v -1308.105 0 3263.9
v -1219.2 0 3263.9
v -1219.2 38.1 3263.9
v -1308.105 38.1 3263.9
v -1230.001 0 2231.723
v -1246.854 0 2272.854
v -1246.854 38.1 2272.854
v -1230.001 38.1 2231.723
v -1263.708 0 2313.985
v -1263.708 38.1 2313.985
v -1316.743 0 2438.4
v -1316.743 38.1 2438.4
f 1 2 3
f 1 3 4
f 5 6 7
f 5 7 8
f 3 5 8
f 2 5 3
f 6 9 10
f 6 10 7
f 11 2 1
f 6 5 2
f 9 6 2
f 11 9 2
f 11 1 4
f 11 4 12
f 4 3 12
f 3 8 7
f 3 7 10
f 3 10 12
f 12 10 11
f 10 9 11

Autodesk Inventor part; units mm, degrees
ref_plane "YZ Plane" through (0, 0, 0) normal (1, 0, 0) x (0, 1, 0)
ref_plane "XZ Plane" through (0, 0, 0) normal (0, 1, 0) x (-1, 0, 0)
ref_plane "XY Plane" through (0, 0, 0) normal (0, 0, 1) x (1, 0, 0)
sketch "Sketch1" plane through (0, 0, 0) normal (0, 1, 0) x (-1, 0, 0)
  line L0 (0, 0) -> (0, -1219.2)
  line L1 (0, 0) -> (88.9, 0)
  line L2 (88.9, 0) -> (88.9, -1219.2)
  line L3 (88.9, -1219.2) -> (0, -1219.2)
  line L4 (0, 0) -> (0, 1219.2) construction
  line L5 (0, 1219.2) -> (1219.2, 1219.2) construction
  line L6 (0, 1219.2) -> (0, 3657.6) construction
  line L7 (0, 3657.6) -> (0, 4876.8) construction
  line L8 (0, 4876.8) -> (0, 6096) construction
  line L9 (0, -1219.2) -> (2438.4, -1219.2) construction
  line L10 (0, 6096) -> (2438.4, 6096) construction
  line L11 (2438.4, 6096) -> (2438.4, -1219.2) construction
  line L12 (0, 3657.6) -> (0, 3352.8) construction
  line L13 (0, 3352.8) -> (2438.4, 3352.8) construction
  line L14 (2438.4, 3352.8) -> (1219.2, 3352.8)
  line L15 (1219.2, 3352.8) -> (1219.2, 3263.9)
  line L16 (1219.2, 3263.9) -> (2438.4, 3263.9)
  line L17 (2438.4, 3263.9) -> (2438.4, 3352.8)
  line L18 (0, 6096) -> (862.1046, 6958.1046)
  line L19 (862.1046, 6958.1046) -> (924.9664, 6895.2428)
  line L20 (924.9664, 6895.2428) -> (62.8618, 6033.1382)
  line L21 (62.8618, 6033.1382) -> (0, 6096)
  line L22 (0, 4876.8) -> (1219.2, 4876.8) construction
  line L23 (1219.2, 4876.8) -> (2081.3046, 5738.9046)
  line L24 (1219.2, 1219.2) -> (2081.3046, 357.0954)
  line L25 (2081.3046, 357.0954) -> (2018.4428, 294.2336)
  line L26 (2018.4428, 294.2336) -> (1156.3382, 1156.3382)
  line L27 (1156.3382, 1156.3382) -> (1219.2, 1219.2)
  line L28 (2018.4428, 294.2336) -> (88.9, -1219.2)
  line L29 (2081.3046, 357.0954) -> (2144.1664, 419.9572)
  line L30 (2144.1664, 419.9572) -> (1282.0618, 1282.0618)
  line L31 (1282.0618, 1282.0618) -> (1219.2, 1219.2)
  line L32 (2438.4, 3352.8) -> (2438.4, 3441.7)
  line L33 (2438.4, 3441.7) -> (1219.2, 3441.7)
  line L34 (1219.2, 3441.7) -> (1219.2, 3352.8)
  line L35 (1156.3382, 4939.6618) -> (1282.0618, 4813.9382)
  line L36 (2018.4428, 5801.7664) -> (2144.1664, 5676.0428)
  line L37 (1282.0618, 4813.9382) -> (2144.1664, 5676.0428)
  line L38 (2018.4428, 5801.7664) -> (1156.3382, 4939.6618)
  line L39 (2018.4428, 5801.7664) -> (924.9664, 6895.2428)
  line L40 (62.8618, 6033.1382) -> (1156.3382, 4939.6618)
  line L41 (1233.6206, 4168.8855) -> (1267.6412, 4086.7527)
  line L42 (1263.7078, 2313.9849) -> (1230.0006, 2231.7229)
  arc A0 (862.1046, 6958.1046) -> (0, 6096) centre (431.0523, 6527.0523) ccw
  line L43 (1246.8542, 2272.8539) -> (2375.0183, 1810.583)
  line L44 (2391.8719, 1851.7139) -> (2358.1646, 1769.452)
  line L45 (2391.8719, 1851.7139) -> (1263.7078, 2313.9849)
  line L46 (1230.0006, 2231.7229) -> (2358.1646, 1769.452)
  line L47 (1230.0006, 2231.7229) -> (1219.2, 3263.9)
  line L48 (2144.1664, 419.9572) -> (2391.8719, 1851.7139)
  line L49 (2391.8719, 1851.7139) -> (2438.4, 3263.9)
  line L50 (1219.2, 3441.7) -> (1233.6206, 4168.8855)
  line L51 (1250.6309, 4127.8191) -> (2377.0248, 4594.3867)
  line L52 (2360.0145, 4635.4532) -> (2394.0351, 4553.3203)
  line L53 (2394.0351, 4553.3203) -> (1267.6412, 4086.7527)
  line L54 (2360.0145, 4635.4532) -> (1233.6206, 4168.8855)
  line L55 (2394.0351, 4553.3203) -> (2144.1664, 5676.0428)
  line L56 (2438.4, 3441.7) -> (2394.0351, 4553.3203)
  line L57 (2144.1664, 5676.0428) -> (2057.3895, 5656.7301)
  line L58 (2394.0351, 4553.3203) -> (2305.2058, 4549.7751)
  line L59 (2394.0351, 4553.3203) -> (2307.2582, 4534.0076)
  line L60 (2307.2582, 4534.0076) -> (2057.3895, 5656.7301)
  line L61 (2438.4, 3441.7) -> (2349.5707, 3438.1548)
  line L62 (2349.5707, 3438.1548) -> (2305.2058, 4549.7751)
  line L63 (1219.2, 3441.7) -> (1308.0825, 3439.9374)
  line L64 (1233.6206, 4168.8855) -> (1322.5031, 4167.1229)
  line L65 (1322.5031, 4167.1229) -> (1308.0825, 3439.9374)
  line L66 (2018.4428, 5801.7664) -> (1955.581, 5738.9046)
  line L67 (1955.581, 5738.9046) -> (862.1046, 6832.381)
  line L68 (924.9664, 6895.2428) -> (862.1046, 6832.381)
  line L69 (62.8618, 6033.1382) -> (125.7236, 6096)
  line L70 (62.8618, 6033.1382) -> (125.7236, 6096)
  line L71 (125.7236, 6096) -> (1219.2, 5002.5236)
  line L72 (1156.3382, 1156.3382) -> (0, 0)
  line L73 (0, 0) -> (62.8618, -62.8618)
  line L74 (1156.3382, 1156.3382) -> (1219.2, 1093.4764)
  line L75 (1219.2, 1093.4764) -> (62.8618, -62.8618)
  line L76 (2018.4428, 294.2336) -> (1963.5776, 364.1837)
  line L77 (88.9, -1219.2) -> (34.0348, -1149.2499)
  line L78 (34.0348, -1149.2499) -> (1963.5776, 364.1837)
  line L79 (2144.1664, 419.9572) -> (2056.5677, 435.1125)
  line L80 (2391.8719, 1851.7139) -> (2304.2732, 1866.8692)
  line L81 (2391.8719, 1851.7139) -> (2303.0201, 1854.6414)
  line L82 (2304.2732, 1866.8692) -> (2056.5677, 435.1125)
  line L83 (1230.0006, 2231.7229) -> (1318.8957, 2232.6531)
  line L84 (1219.2, 3263.9) -> (1308.0951, 3264.8302)
  line L85 (1308.0951, 3264.8302) -> (1318.8957, 2232.6531)
  line L86 (2438.4, 3263.9) -> (2349.5482, 3266.8275)
  line L87 (2349.5482, 3266.8275) -> (2303.0201, 1854.6414)
  line L88 (88.9, 0) -> (125.7236, 0)
  line L89 (1233.6206, 4168.8855) -> (1219.2, 4876.8)
  line L90 (1233.6206, 4168.8855) -> (1322.5022, 4170.6961)
  line L91 (1219.2, 4876.8) -> (1308.0816, 4878.6106)
  line L92 (1308.0816, 4878.6106) -> (1322.5022, 4170.6961)
  line L93 (1282.0618, 4813.9382) -> (1309.9674, 4786.0326)
  line L94 (1267.6412, 4086.7527) -> (1318.4756, 3964.0275)
  line L95 (2360.0145, 4635.4532) -> (2374.4273, 4641.4231)
  line L96 (1230.0006, 2231.7229) -> (1219.2, 1219.2)
  line L97 (1230.0006, 2231.7229) -> (1318.8955, 2230.7747)
  line L98 (1219.2, 1219.2) -> (1308.0949, 1218.2518)
  line L99 (1308.0949, 1218.2518) -> (1318.8955, 2230.7747)
  line L100 (1282.0618, 1282.0618) -> (1309.0636, 1309.0636)
  line L101 (1263.7078, 2313.9849) -> (1316.7428, 2438.4)
  line L102 (2358.1646, 1769.452) -> (2376.5379, 1763.082)
  point P0 (1770.957, 2057.4547)
  point P1 (1955.1236, 357.5528)
  point P2 (88.9, -1106.2164)
  point P3 (2292.1025, 1796.5213)
  point P4 (2067.2525, 496.8711)
  point P5 (1318.5187, 2195.4522)
  point P6 (1308.1049, 3263.9)
  point P7 (2349.4518, 3263.9)
  point P8 (2304.1085, 1887.6754)
  dimension "d0" = 1219.2
  dimension "d2" = 1219.2
  dimension "d3" = 1219.2
  dimension "d16" = 2438.4
  dimension "d17" = 1219.2
  dimension "d18" = 1219.2
  dimension "d20" = 2438.4
  dimension "d21" = 304.8
  dimension "d22" = 1219.2
  dimension "d23" = 88.9
  dimension "d24" = 1219.2
  dimension "d25" = 45
  dimension "d26" = 88.9
  dimension "d27" = 1219.2
  dimension "d28" = 1219.2
  dimension "d29" = 1219.2
  dimension "d31" = 1219.2
  dimension "d32" = 88.9
  dimension "d33" = 88.9
  dimension "d34" = 88.9
  dimension "d35" = 177.8
  dimension "d36" = 177.8
  dimension "d38" = 88.9
  dimension "d39" = 88.9
  dimension "d43" = 1219.2
  dimension "d44" = 88.9
  dimension "d45" = 1219.2
  dimension "d46" = 88.9
  dimension "d47" = 88.9
  dimension "d48" = 88.9
  dimension "d49" = 88.9
  dimension "d50" = 88.9
  dimension "d51" = 88.9
  dimension "d54" = 88.9
  dimension "d55" = 88.9
  dimension "d57" = 88.9
  dimension "d58" = 88.9
  dimension "d59" = 88.9
  dimension "d60" = 88.9
  dimension "d61" = 88.9
  dimension "d64" = 88.9
  dimension "d65" = 88.9
  dimension "d66" = 88.9
  dimension "d69" = 88.9
  dimension "d70" = 88.9
  dimension "d71" = 88.9
  dimension "d72" = 88.9
extrude "Extrusion1" add sketch "Sketch1" along normal blind 38.1 contours L47 L16 L85 L101 L42
properties part number "S_2x4x40.639"
